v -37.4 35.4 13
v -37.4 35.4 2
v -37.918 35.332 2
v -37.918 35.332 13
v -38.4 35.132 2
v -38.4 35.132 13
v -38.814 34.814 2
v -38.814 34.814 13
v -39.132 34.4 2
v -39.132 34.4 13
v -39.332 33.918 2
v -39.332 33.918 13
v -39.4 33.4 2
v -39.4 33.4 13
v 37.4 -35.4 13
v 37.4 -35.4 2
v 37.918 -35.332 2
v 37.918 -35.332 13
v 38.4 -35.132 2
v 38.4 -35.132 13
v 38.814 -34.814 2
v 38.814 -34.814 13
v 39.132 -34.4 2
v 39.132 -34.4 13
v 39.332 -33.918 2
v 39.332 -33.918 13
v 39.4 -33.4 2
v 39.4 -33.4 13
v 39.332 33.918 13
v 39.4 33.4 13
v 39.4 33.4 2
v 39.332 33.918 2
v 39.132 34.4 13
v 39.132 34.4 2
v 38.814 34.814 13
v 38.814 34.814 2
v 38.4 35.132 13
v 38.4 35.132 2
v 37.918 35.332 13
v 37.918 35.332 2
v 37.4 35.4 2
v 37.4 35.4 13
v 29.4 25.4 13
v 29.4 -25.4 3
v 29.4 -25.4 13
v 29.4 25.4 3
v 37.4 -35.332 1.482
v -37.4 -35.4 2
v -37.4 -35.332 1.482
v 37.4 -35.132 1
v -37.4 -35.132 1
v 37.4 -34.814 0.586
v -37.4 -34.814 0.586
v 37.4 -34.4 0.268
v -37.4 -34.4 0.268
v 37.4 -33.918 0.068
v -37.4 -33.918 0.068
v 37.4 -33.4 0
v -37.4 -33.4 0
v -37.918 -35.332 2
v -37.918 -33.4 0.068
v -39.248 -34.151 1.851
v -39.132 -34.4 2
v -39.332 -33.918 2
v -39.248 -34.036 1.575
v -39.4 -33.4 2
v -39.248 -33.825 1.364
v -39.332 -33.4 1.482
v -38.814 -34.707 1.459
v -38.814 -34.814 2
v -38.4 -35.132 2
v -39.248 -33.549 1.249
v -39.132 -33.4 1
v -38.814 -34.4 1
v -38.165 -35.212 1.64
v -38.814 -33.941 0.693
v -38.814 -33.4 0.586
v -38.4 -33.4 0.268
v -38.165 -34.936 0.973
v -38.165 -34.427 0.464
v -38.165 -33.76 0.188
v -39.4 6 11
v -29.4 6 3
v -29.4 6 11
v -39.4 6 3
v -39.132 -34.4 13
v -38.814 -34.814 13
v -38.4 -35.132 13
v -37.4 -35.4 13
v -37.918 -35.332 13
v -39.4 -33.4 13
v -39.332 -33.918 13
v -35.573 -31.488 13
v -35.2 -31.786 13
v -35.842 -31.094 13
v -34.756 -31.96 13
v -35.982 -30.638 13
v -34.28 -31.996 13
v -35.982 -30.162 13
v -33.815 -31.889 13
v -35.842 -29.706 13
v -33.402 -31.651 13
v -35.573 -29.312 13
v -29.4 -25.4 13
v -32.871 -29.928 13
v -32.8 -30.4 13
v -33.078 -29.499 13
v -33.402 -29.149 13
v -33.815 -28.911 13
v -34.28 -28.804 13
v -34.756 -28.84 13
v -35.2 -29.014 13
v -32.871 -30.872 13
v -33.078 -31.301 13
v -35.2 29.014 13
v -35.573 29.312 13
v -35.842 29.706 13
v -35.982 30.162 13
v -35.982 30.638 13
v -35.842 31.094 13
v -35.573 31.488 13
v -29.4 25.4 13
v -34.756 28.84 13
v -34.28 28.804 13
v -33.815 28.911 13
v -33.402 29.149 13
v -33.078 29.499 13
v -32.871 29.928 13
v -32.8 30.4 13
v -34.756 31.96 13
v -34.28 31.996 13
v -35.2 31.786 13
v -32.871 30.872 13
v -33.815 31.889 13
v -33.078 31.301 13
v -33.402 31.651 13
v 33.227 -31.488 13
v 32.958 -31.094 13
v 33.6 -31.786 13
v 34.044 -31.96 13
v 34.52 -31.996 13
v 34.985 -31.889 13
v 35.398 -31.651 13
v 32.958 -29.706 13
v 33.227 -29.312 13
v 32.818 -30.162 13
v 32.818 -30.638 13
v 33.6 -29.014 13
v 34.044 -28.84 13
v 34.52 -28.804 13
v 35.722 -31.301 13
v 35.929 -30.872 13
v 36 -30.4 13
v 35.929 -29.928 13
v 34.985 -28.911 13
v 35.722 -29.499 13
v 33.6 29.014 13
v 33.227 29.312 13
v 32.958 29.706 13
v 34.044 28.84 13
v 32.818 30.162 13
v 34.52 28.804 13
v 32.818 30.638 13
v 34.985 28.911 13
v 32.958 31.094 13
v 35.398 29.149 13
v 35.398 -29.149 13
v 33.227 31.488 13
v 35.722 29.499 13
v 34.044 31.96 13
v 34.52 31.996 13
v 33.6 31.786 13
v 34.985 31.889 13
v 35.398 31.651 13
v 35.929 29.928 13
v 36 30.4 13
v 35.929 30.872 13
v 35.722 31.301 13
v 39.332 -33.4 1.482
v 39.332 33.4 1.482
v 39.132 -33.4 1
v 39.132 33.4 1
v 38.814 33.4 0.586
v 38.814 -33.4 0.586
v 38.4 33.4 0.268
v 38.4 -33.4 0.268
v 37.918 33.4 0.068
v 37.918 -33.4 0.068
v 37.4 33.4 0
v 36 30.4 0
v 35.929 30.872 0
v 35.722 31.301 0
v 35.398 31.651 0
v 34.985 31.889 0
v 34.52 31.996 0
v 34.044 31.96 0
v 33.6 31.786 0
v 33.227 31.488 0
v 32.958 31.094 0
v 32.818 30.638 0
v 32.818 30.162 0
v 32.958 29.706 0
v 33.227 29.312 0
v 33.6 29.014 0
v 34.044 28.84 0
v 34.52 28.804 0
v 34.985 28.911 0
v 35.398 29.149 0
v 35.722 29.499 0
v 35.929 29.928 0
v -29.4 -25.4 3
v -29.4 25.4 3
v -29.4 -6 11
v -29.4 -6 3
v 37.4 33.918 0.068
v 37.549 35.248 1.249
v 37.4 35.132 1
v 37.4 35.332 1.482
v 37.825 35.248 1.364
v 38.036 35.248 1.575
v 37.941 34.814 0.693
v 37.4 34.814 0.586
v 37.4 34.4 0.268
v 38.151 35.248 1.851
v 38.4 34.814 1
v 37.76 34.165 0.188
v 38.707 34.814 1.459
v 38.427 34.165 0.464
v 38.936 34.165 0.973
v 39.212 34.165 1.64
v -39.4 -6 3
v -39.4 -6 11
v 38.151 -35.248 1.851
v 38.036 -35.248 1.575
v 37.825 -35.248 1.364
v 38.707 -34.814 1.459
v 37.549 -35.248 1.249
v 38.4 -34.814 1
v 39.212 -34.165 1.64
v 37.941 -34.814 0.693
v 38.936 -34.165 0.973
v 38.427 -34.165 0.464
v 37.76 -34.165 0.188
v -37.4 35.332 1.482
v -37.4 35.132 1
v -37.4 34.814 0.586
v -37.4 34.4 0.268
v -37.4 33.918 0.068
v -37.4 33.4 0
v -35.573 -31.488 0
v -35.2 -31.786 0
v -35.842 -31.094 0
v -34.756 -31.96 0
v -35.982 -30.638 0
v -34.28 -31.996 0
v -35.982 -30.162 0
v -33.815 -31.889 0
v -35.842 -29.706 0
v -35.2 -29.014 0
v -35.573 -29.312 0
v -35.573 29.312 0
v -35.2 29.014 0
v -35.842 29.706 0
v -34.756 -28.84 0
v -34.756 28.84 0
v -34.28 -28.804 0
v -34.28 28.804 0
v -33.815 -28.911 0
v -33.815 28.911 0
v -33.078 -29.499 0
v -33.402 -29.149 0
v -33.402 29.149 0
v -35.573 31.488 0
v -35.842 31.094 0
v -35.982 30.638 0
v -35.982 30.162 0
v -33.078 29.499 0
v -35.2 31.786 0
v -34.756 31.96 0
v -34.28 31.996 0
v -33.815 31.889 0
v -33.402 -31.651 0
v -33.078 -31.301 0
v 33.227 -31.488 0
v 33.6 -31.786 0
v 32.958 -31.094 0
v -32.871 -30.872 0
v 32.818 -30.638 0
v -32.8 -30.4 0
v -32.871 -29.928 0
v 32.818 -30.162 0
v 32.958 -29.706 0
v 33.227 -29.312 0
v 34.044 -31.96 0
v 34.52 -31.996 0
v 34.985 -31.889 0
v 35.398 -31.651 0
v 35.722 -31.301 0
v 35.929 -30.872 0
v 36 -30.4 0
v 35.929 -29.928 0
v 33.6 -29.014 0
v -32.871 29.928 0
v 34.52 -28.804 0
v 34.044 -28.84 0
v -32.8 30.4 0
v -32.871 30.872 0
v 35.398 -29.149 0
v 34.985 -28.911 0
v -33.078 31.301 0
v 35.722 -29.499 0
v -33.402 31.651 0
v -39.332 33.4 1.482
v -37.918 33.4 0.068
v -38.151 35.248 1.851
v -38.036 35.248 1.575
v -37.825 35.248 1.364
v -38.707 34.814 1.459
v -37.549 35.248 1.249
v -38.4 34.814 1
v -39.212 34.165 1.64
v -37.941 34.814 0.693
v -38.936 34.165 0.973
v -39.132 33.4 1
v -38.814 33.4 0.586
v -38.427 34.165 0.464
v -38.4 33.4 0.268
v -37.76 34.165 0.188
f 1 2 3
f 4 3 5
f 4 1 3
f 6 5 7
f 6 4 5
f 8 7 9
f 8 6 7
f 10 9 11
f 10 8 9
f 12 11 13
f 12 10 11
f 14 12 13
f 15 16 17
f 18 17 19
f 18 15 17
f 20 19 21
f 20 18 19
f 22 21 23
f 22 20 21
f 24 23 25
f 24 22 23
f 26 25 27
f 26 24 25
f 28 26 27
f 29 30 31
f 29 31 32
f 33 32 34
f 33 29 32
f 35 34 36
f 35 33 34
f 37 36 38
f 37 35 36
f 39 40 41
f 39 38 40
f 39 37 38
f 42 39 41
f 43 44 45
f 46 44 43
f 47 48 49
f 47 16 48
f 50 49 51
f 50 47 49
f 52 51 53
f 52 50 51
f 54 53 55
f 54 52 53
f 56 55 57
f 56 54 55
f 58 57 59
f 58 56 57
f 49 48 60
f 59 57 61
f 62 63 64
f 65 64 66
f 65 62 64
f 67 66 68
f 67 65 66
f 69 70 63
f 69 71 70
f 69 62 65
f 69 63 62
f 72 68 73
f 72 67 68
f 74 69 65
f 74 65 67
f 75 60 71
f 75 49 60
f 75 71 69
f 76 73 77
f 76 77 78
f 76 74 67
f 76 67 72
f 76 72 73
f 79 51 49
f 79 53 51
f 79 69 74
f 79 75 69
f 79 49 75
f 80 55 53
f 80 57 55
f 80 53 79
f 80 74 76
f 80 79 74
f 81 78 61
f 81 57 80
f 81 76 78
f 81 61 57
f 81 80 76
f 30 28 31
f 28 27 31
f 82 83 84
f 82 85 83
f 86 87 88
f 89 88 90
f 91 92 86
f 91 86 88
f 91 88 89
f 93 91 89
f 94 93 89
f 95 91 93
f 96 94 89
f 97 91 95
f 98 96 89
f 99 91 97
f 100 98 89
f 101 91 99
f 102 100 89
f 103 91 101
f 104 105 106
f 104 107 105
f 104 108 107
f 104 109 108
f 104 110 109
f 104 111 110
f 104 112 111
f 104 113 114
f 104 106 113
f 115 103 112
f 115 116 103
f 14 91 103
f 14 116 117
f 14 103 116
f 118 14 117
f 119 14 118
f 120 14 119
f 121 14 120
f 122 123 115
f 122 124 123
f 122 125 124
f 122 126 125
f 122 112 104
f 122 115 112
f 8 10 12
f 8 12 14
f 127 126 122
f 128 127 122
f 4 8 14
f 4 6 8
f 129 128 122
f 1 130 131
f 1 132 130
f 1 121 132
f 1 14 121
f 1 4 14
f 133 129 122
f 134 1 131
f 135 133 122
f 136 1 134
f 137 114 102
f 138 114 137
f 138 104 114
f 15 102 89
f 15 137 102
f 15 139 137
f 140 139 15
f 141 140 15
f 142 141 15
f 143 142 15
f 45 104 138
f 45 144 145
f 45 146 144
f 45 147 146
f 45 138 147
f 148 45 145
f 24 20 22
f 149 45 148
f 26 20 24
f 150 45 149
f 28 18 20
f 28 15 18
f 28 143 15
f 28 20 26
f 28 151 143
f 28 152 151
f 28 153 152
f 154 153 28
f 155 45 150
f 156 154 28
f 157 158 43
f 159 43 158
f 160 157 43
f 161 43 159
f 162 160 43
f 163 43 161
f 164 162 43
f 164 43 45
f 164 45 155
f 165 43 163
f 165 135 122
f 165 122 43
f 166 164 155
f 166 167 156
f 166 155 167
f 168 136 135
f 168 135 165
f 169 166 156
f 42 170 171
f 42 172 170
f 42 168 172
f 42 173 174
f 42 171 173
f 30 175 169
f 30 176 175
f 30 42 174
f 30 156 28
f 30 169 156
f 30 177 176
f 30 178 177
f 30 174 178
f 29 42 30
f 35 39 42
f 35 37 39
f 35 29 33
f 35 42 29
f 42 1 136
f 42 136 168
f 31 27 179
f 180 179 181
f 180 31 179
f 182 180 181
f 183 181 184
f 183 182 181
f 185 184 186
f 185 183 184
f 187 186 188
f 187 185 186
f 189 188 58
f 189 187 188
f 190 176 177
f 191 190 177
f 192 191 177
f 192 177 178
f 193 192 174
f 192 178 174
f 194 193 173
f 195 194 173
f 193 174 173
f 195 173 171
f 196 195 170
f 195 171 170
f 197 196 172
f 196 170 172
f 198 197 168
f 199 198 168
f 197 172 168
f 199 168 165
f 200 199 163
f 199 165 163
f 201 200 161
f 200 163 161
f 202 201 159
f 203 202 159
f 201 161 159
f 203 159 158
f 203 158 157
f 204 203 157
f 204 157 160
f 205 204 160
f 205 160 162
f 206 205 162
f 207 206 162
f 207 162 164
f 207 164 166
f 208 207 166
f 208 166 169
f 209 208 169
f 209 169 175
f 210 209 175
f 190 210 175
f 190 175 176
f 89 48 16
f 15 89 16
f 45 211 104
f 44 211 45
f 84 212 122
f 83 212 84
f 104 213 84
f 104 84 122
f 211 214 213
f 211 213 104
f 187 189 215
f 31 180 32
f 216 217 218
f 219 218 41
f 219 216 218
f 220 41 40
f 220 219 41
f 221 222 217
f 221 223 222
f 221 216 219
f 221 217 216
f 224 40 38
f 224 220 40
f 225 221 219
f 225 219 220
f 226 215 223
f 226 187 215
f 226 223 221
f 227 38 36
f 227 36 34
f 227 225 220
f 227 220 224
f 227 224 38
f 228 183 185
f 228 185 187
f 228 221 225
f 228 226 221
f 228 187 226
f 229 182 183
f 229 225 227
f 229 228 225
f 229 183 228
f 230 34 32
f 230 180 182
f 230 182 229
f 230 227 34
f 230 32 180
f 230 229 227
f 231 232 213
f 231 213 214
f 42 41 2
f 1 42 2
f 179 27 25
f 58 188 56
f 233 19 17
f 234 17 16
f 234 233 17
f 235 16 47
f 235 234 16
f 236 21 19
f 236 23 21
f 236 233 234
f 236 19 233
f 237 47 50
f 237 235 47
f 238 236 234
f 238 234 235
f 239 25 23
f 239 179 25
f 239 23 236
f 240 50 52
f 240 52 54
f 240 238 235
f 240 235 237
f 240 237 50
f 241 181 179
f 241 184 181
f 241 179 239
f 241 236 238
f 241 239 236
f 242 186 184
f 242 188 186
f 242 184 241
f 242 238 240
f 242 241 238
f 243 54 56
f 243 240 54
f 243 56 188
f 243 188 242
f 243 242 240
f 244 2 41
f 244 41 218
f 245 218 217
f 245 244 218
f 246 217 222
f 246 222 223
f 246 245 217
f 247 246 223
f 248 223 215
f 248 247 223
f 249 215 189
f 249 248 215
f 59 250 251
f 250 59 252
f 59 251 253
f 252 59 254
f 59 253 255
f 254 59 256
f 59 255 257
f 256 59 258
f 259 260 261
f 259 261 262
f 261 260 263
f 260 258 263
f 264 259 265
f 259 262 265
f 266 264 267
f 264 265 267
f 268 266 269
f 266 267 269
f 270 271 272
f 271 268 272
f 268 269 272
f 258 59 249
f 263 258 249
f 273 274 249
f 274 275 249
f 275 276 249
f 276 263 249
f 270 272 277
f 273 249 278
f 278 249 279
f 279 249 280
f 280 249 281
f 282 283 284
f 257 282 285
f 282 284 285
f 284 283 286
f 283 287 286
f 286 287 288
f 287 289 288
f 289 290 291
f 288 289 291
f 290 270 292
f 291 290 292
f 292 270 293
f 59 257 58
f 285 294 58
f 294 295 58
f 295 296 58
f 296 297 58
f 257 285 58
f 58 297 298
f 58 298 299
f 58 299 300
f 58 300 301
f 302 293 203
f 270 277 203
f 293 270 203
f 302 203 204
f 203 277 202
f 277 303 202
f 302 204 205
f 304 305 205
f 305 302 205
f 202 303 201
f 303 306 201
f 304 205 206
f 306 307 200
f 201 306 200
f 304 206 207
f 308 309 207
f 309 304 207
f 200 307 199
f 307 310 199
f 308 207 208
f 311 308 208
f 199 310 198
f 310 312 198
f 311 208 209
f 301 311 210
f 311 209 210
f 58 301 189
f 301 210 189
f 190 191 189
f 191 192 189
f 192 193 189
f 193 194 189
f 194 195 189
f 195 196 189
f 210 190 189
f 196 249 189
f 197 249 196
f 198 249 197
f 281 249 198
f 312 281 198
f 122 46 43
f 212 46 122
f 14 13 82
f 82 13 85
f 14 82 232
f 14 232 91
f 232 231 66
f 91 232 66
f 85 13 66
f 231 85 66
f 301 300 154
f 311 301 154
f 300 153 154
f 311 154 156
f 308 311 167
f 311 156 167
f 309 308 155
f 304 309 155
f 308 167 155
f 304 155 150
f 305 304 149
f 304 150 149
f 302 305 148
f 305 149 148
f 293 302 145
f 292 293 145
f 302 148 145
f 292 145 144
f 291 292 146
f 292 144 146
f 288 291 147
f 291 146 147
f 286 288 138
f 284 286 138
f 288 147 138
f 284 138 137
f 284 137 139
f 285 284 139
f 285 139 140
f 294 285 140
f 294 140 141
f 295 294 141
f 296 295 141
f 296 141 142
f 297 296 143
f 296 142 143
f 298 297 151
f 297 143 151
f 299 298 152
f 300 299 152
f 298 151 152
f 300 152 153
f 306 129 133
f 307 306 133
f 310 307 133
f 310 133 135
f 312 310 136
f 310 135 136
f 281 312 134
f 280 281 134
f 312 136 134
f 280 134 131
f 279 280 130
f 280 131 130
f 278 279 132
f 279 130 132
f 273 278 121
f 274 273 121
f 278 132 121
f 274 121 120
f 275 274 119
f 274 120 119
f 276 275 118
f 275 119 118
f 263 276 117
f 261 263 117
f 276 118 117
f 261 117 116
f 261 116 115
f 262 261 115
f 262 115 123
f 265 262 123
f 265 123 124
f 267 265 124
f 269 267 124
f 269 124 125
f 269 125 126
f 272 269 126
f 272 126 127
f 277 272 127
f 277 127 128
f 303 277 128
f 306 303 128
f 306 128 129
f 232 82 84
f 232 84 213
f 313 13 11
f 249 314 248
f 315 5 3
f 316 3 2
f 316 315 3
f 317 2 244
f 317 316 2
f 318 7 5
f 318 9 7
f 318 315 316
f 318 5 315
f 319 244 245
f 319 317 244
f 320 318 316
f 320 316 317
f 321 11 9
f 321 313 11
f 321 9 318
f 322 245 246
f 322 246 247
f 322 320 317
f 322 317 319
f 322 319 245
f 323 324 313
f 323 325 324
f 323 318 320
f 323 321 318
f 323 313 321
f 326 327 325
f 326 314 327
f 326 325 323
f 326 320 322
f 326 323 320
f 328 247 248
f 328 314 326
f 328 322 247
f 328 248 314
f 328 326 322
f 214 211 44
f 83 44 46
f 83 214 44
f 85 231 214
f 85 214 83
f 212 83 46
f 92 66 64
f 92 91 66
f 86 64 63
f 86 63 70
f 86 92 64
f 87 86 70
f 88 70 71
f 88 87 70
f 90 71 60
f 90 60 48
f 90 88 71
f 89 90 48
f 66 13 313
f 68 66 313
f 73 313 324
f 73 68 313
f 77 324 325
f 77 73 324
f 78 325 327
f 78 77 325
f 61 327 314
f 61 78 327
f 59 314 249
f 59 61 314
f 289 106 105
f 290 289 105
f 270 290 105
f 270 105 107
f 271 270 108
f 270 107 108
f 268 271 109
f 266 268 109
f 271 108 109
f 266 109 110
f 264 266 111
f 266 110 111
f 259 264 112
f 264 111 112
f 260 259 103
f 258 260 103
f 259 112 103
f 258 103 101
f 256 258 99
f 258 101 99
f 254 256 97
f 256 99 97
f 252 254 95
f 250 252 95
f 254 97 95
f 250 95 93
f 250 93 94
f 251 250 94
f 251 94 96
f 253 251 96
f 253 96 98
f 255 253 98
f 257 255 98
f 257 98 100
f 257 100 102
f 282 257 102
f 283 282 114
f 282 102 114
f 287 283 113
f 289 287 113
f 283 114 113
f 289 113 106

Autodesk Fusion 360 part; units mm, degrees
sketch "Sketch1" plane through (0, 0, 0) normal (0, 0, 1) x (1, 0, 0)
  line L0 (29.4, 25.4) -> (-29.4, 25.4)
  line L1 (-29.4, 25.4) -> (-29.4, -25.4)
  line L2 (-29.4, -25.4) -> (29.4, -25.4)
  line L3 (29.4, -25.4) -> (29.4, 25.4)
  line L4 (29.4, 25.4) -> (-29.4, -25.4) construction
  line L5 (-29.4, 25.4) -> (29.4, -25.4) construction
  line L6 (-39.4, 35.4) -> (-39.4, -35.4)
  line L7 (-39.4, -35.4) -> (39.4, -35.4)
  line L8 (39.4, -35.4) -> (39.4, 35.4)
  line L9 (39.4, 35.4) -> (-39.4, 35.4)
  dimension "d1" = 58.8
  dimension "d2" = 50.8
  dimension "d3" = 10
extrude "Extrude6" add sketch "Sketch1" along normal blind 3 contours L0 L1 L2 L3
extrude "Extrude7" add sketch "Sketch1" along normal blind 13
sketch "Sketch2" plane through (39.4, 0, 0) normal (1, 0, 0) x (0, 1, 0)
  line L0 (-35.4, 0) -> (35.4, 0)
  line L1 (35.4, 0) -> (35.4, 13)
  line L2 (35.4, 13) -> (-35.4, 13)
  line L3 (-35.4, 13) -> (-35.4, 0)
  line L4 (6, 11.3977) -> (-6, 11.3977)
  line L5 (-6, 11.3977) -> (-6, 3.3977)
  line L6 (-6, 3.3977) -> (6, 3.3977)
  line L7 (6, 3.3977) -> (6, 11.3977)
  line L8 (6, 11.3977) -> (-6, 3.3977) construction
  line L9 (-6, 11.3977) -> (6, 3.3977) construction
  point P0 (0, 7.3977)
  dimension "d18" = 12
  dimension "d19" = 8
sketch "Sketch3" plane through (0, 0, 13) normal (0, 0, 1) x (1, 0, 0)
  line L0 (29.4, 25.4) -> (29.4, -25.4)
  line L1 (29.4, -25.4) -> (-29.4, -25.4)
  line L2 (-29.4, -25.4) -> (-29.4, 25.4)
  line L3 (-29.4, 25.4) -> (29.4, 25.4)
  line L4 (39.4, 35.4) -> (-39.4, 35.4)
  line L5 (-39.4, 35.4) -> (-39.4, -35.4)
  line L6 (-39.4, -35.4) -> (39.4, -35.4)
  line L7 (39.4, -35.4) -> (39.4, 35.4)
  circle A0 centre (-34.4, 30.4) radius 1.6
  circle A1 centre (34.4, 30.4) radius 1.6
  circle A2 centre (-34.4, -30.4) radius 1.6
  circle A3 centre (34.4, -30.4) radius 1.6
extrude "Extrude9" cut sketch "Sketch3" against normal blind 13 contours A0 | A1 | A2 | A3
fillet "Fillet1" radius 2 8 edges at (39.4, 0, 0) (39.4, 35.4, 6.5) (39.4, -35.4, 6.5) (0, -35.4, 0) (-39.4, -35.4, 6.5) (-39.4, 0, 0) (-39.4, 35.4, 6.5) (0, 35.4, 0)
sketch "Sketch4" plane through (-39.4, 0, 0) normal (-1, 0, 0) x (0, -1, 0)
  line L0 (-33.4, 13) -> (-33.4, 2)
  line L1 (-33.4, 2) -> (33.4, 2)
  line L2 (33.4, 2) -> (33.4, 13)
  line L3 (33.4, 13) -> (-33.4, 13)
  line L4 (-6, 3.4) -> (6, 3.4)
  line L5 (6, 3.4) -> (6, 11.4)
  line L6 (6, 11.4) -> (-6, 11.4)
  line L7 (-6, 11.4) -> (-6, 3.4)
extrude "Extrude10" cut sketch "Sketch4" along normal blind 10 contours L4 L5 L6 L7
sketch "Sketch5" plane through (39.4, 0, 0) normal (1, 0, 0) x (0, 1, 0)
  line L0 (33.4, 2) -> (33.4, 13)
  line L1 (33.4, 13) -> (-33.4, 13)
  line L2 (-33.4, 13) -> (-33.4, 2)
  line L3 (-33.4, 2) -> (33.4, 2)
  line L4 (-6, 11) -> (6, 11)
  line L5 (6, 11) -> (6, 3)
  line L6 (6, 3) -> (-6, 3)
  line L7 (-6, 3) -> (-6, 11)
  line L8 (-6, 11) -> (6, 3) construction
  line L9 (6, 11) -> (-6, 3) construction
  point P0 (0, 7)
  dimension "d28" = 12
  dimension "d29" = 8
sketch "Sketch6" plane through (0, 0, 0) normal (1, 0, 0) x (0, 1, 0)
sketch "Sketch7" plane through (-39.4, 0, 0) normal (-1, 0, 0) x (0, -1, 0)
  line L0 (-33.4, 13) -> (-33.4, 2)
  line L1 (-33.4, 2) -> (33.4, 2)
  line L2 (33.4, 2) -> (33.4, 13)
  line L3 (33.4, 13) -> (-33.4, 13)
  line L4 (-6, 11) -> (6, 11)
  line L5 (6, 11) -> (6, 3)
  line L6 (6, 3) -> (-6, 3)
  line L7 (-6, 3) -> (-6, 11)
  line L8 (-6, 11) -> (6, 3) construction
  line L9 (6, 11) -> (-6, 3) construction
  point P0 (0, 7)
  dimension "d32" = 12
  dimension "d33" = 8
extrude "Extrude12" cut sketch "Sketch7" against normal blind 27 contours L4 L5 L6 L7
